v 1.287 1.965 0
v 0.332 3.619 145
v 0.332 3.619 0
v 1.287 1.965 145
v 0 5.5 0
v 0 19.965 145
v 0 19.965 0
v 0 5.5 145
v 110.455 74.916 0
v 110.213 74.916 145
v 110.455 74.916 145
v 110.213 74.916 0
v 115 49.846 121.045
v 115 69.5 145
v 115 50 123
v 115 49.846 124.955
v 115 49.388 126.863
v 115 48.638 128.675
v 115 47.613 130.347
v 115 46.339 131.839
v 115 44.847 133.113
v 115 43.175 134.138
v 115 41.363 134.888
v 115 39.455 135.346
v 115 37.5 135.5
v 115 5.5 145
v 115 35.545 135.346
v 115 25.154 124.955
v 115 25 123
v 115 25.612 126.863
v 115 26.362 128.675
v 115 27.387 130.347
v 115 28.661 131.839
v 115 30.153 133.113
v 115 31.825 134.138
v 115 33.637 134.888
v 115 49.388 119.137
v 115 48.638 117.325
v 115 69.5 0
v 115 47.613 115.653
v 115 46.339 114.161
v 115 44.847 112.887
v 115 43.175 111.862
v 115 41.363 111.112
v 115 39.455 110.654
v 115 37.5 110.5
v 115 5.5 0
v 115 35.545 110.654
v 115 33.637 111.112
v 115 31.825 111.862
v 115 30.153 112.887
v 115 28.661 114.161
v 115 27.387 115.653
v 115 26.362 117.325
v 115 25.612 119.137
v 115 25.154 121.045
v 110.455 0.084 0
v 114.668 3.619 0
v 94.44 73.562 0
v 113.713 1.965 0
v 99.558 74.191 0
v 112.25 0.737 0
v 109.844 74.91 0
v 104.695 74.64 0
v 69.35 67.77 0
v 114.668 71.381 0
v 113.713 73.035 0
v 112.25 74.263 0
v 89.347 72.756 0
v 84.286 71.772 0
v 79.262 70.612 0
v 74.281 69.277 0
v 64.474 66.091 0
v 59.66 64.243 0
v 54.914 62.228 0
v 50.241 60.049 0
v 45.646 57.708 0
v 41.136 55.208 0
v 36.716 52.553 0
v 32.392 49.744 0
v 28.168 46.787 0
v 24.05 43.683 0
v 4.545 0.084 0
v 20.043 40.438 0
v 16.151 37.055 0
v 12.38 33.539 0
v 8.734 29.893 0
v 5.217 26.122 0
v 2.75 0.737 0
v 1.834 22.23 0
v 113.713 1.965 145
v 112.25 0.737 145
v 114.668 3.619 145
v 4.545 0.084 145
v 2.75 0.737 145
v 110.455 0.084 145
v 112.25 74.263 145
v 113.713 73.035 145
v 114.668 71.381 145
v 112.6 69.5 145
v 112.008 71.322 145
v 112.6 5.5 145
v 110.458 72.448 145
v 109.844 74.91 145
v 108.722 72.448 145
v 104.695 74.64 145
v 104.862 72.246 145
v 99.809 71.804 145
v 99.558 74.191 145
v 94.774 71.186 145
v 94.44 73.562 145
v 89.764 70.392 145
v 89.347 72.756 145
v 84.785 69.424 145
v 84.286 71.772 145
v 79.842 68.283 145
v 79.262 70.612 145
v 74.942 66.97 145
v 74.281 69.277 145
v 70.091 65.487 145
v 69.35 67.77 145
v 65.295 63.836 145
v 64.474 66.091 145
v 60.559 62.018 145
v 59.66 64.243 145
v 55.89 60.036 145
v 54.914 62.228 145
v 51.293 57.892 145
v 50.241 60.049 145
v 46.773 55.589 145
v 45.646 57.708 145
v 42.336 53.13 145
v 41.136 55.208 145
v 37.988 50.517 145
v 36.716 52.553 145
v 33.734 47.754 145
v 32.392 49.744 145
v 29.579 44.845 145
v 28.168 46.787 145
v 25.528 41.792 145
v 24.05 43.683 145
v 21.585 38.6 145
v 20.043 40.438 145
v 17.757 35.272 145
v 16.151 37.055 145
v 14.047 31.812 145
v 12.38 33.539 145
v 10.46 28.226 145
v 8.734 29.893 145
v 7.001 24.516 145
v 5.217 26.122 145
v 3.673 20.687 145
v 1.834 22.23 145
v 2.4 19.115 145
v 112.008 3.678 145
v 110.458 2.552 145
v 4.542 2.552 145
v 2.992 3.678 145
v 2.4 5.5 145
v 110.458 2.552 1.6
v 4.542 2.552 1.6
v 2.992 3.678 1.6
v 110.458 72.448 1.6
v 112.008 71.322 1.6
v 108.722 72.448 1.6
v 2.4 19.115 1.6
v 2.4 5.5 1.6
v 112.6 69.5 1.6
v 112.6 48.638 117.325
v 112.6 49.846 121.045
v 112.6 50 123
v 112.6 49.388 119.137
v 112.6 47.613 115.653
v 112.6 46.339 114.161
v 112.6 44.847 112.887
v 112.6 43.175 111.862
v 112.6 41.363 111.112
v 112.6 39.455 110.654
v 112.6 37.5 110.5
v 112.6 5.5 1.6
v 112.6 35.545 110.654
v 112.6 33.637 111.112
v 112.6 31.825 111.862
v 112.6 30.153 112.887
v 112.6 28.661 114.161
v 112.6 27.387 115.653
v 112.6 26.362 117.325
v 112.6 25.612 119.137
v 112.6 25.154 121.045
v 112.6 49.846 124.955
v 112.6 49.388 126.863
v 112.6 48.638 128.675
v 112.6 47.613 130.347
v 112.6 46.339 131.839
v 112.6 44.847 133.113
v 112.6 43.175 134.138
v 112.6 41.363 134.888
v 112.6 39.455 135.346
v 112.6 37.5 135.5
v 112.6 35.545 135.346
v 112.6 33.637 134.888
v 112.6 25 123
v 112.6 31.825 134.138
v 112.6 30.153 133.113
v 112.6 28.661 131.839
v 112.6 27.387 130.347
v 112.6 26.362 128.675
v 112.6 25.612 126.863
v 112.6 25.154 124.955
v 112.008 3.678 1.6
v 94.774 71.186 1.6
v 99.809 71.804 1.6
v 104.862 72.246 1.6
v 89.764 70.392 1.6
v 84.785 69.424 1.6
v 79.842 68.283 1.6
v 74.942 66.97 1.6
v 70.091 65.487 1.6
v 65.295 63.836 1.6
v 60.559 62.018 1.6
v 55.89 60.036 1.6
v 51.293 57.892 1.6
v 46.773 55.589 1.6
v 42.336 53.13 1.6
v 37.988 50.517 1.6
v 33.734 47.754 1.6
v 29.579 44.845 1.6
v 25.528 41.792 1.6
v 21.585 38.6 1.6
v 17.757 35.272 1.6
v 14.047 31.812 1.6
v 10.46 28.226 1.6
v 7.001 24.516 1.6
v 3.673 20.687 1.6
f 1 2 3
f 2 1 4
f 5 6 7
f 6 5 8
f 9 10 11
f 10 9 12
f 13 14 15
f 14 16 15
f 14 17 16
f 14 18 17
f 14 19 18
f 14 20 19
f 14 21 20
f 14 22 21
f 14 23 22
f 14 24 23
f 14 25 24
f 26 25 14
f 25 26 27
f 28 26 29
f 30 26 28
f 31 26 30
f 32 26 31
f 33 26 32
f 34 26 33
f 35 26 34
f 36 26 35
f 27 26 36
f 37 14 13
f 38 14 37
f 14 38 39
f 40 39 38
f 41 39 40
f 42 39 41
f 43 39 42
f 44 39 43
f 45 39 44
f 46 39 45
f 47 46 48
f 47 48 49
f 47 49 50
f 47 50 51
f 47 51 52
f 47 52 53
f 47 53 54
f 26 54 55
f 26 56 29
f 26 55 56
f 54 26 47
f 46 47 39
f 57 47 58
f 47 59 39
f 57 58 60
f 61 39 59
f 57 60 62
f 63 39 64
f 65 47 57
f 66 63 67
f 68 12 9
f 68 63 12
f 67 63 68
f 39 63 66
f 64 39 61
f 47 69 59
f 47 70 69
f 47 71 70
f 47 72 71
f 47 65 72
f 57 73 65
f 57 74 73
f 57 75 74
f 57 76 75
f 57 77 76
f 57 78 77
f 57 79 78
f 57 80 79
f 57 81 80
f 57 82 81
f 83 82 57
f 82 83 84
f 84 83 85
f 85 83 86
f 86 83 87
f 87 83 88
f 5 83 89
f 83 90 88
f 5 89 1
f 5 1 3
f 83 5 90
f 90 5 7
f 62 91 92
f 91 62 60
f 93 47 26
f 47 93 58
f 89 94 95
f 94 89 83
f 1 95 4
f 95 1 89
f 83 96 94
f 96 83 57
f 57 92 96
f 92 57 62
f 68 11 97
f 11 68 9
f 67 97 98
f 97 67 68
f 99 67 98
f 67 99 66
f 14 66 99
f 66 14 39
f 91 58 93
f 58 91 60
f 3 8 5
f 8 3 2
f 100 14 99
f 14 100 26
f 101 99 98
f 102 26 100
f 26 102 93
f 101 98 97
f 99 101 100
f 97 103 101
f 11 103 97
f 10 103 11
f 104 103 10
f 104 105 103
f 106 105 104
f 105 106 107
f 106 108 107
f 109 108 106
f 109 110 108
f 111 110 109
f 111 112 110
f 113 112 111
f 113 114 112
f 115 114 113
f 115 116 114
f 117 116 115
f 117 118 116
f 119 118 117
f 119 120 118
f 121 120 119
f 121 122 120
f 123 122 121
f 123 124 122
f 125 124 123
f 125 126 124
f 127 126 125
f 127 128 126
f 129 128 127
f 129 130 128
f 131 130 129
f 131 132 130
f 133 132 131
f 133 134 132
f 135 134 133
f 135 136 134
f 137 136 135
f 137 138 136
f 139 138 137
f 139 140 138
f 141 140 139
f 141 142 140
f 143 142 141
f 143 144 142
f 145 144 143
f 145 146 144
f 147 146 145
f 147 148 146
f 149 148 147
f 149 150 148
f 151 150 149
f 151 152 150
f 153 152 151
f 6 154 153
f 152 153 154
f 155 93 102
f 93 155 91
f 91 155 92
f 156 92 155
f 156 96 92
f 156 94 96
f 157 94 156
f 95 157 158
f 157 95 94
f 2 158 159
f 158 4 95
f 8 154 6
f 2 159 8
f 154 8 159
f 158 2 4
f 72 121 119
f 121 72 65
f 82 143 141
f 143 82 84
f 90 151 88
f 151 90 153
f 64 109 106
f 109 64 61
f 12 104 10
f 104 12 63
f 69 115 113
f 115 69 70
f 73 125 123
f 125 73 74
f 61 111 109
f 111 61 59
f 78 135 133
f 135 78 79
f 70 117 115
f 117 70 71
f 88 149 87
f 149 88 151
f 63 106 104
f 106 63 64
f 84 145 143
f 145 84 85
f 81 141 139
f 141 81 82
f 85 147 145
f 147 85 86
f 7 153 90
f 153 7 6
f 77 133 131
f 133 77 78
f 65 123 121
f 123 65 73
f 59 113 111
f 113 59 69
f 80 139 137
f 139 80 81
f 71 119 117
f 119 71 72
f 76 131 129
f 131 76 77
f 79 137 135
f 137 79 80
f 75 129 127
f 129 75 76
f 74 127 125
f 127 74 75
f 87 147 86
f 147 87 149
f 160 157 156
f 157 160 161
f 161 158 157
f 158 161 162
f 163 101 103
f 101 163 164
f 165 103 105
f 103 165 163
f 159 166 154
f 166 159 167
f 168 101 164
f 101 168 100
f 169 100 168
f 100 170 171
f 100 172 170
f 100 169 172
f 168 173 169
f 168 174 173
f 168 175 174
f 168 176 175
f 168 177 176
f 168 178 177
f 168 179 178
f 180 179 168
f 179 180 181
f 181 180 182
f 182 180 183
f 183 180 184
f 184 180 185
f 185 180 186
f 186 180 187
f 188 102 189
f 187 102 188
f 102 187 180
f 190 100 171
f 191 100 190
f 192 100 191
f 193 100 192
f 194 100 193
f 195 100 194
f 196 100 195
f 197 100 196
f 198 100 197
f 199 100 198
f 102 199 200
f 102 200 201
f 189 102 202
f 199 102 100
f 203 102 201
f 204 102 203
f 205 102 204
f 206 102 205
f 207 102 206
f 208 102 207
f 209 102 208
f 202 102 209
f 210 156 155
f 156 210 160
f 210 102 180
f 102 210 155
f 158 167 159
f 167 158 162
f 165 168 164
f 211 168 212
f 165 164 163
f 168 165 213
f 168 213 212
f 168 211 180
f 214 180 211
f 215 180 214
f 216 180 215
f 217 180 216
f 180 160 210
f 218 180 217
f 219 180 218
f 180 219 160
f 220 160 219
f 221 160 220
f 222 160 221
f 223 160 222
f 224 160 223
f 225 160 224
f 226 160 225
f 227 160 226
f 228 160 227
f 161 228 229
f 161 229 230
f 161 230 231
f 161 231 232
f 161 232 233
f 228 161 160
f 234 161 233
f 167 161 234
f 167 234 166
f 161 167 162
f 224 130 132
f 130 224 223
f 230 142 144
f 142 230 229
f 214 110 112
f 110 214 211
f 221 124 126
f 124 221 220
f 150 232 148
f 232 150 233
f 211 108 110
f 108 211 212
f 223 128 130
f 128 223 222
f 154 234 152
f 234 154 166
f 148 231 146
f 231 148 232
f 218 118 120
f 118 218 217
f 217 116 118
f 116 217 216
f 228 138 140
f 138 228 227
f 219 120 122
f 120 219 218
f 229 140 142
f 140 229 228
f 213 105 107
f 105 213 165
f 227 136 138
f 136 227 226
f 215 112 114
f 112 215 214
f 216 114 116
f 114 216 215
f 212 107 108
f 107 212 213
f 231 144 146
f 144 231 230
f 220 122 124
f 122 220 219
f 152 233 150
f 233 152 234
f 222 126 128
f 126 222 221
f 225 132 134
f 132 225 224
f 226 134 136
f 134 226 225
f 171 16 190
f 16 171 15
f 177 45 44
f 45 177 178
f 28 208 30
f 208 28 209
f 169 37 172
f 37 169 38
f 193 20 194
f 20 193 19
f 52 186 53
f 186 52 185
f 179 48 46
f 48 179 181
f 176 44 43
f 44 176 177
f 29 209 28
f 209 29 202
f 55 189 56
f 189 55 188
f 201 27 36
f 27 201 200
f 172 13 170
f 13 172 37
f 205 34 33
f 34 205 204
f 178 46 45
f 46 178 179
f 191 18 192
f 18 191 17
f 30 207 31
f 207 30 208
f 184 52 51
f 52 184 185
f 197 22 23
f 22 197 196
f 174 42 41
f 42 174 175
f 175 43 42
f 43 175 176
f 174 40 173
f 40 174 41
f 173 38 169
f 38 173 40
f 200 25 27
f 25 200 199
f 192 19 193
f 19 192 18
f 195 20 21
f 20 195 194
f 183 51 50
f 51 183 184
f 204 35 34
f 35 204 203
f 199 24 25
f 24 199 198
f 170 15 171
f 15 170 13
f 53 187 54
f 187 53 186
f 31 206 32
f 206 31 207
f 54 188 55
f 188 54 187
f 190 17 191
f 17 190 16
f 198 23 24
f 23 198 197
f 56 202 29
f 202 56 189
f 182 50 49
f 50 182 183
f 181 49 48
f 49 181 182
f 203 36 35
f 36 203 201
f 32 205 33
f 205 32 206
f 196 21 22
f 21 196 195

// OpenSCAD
lenght = 115;               // [50:5:200]
width = 75;                 // [50:5:200]
height = 145;               // [50:5:200]

wall_thickness = 2.4;       // [0.5:0.1:5]
bottom_thickness = 1.6;     // [0.5:0.1:5]

/* [Hidden] */

$fa = 2;
e = 0.01;

cornerD = 11;
outD = (lenght*lenght + (width-20)*(width-20)) / (width-20);

module vol(h, cornerD, cornerOfs, outD, outOfs)
{
    intersection()
    {
        hull()
        {
            translate([cornerOfs/2, cornerOfs/2, 0]) cylinder(height, d=cornerD);
            translate([lenght - cornerOfs/2, cornerOfs/2, 0]) cylinder(height, d=cornerD);
            translate([cornerOfs/2, width - cornerOfs/2, 0]) cylinder(height, d=cornerD);
            translate([lenght - cornerOfs/2, width - cornerOfs/2, 0]) cylinder(height, d=cornerD);
        }

        translate([lenght, width-outOfs/2, 0]) cylinder(height, d=outD);
    }
}

difference()
{
    vol(height, cornerD, cornerD, outD, outD);
    translate([0, 0, bottom_thickness]) vol(height, cornerD - 2*wall_thickness, cornerD, outD - 2*wall_thickness, outD);
    translate([lenght - wall_thickness-e, width/2, height-22]) rotate([0, 90, 0]) cylinder(wall_thickness+2*e, d=25);
}
